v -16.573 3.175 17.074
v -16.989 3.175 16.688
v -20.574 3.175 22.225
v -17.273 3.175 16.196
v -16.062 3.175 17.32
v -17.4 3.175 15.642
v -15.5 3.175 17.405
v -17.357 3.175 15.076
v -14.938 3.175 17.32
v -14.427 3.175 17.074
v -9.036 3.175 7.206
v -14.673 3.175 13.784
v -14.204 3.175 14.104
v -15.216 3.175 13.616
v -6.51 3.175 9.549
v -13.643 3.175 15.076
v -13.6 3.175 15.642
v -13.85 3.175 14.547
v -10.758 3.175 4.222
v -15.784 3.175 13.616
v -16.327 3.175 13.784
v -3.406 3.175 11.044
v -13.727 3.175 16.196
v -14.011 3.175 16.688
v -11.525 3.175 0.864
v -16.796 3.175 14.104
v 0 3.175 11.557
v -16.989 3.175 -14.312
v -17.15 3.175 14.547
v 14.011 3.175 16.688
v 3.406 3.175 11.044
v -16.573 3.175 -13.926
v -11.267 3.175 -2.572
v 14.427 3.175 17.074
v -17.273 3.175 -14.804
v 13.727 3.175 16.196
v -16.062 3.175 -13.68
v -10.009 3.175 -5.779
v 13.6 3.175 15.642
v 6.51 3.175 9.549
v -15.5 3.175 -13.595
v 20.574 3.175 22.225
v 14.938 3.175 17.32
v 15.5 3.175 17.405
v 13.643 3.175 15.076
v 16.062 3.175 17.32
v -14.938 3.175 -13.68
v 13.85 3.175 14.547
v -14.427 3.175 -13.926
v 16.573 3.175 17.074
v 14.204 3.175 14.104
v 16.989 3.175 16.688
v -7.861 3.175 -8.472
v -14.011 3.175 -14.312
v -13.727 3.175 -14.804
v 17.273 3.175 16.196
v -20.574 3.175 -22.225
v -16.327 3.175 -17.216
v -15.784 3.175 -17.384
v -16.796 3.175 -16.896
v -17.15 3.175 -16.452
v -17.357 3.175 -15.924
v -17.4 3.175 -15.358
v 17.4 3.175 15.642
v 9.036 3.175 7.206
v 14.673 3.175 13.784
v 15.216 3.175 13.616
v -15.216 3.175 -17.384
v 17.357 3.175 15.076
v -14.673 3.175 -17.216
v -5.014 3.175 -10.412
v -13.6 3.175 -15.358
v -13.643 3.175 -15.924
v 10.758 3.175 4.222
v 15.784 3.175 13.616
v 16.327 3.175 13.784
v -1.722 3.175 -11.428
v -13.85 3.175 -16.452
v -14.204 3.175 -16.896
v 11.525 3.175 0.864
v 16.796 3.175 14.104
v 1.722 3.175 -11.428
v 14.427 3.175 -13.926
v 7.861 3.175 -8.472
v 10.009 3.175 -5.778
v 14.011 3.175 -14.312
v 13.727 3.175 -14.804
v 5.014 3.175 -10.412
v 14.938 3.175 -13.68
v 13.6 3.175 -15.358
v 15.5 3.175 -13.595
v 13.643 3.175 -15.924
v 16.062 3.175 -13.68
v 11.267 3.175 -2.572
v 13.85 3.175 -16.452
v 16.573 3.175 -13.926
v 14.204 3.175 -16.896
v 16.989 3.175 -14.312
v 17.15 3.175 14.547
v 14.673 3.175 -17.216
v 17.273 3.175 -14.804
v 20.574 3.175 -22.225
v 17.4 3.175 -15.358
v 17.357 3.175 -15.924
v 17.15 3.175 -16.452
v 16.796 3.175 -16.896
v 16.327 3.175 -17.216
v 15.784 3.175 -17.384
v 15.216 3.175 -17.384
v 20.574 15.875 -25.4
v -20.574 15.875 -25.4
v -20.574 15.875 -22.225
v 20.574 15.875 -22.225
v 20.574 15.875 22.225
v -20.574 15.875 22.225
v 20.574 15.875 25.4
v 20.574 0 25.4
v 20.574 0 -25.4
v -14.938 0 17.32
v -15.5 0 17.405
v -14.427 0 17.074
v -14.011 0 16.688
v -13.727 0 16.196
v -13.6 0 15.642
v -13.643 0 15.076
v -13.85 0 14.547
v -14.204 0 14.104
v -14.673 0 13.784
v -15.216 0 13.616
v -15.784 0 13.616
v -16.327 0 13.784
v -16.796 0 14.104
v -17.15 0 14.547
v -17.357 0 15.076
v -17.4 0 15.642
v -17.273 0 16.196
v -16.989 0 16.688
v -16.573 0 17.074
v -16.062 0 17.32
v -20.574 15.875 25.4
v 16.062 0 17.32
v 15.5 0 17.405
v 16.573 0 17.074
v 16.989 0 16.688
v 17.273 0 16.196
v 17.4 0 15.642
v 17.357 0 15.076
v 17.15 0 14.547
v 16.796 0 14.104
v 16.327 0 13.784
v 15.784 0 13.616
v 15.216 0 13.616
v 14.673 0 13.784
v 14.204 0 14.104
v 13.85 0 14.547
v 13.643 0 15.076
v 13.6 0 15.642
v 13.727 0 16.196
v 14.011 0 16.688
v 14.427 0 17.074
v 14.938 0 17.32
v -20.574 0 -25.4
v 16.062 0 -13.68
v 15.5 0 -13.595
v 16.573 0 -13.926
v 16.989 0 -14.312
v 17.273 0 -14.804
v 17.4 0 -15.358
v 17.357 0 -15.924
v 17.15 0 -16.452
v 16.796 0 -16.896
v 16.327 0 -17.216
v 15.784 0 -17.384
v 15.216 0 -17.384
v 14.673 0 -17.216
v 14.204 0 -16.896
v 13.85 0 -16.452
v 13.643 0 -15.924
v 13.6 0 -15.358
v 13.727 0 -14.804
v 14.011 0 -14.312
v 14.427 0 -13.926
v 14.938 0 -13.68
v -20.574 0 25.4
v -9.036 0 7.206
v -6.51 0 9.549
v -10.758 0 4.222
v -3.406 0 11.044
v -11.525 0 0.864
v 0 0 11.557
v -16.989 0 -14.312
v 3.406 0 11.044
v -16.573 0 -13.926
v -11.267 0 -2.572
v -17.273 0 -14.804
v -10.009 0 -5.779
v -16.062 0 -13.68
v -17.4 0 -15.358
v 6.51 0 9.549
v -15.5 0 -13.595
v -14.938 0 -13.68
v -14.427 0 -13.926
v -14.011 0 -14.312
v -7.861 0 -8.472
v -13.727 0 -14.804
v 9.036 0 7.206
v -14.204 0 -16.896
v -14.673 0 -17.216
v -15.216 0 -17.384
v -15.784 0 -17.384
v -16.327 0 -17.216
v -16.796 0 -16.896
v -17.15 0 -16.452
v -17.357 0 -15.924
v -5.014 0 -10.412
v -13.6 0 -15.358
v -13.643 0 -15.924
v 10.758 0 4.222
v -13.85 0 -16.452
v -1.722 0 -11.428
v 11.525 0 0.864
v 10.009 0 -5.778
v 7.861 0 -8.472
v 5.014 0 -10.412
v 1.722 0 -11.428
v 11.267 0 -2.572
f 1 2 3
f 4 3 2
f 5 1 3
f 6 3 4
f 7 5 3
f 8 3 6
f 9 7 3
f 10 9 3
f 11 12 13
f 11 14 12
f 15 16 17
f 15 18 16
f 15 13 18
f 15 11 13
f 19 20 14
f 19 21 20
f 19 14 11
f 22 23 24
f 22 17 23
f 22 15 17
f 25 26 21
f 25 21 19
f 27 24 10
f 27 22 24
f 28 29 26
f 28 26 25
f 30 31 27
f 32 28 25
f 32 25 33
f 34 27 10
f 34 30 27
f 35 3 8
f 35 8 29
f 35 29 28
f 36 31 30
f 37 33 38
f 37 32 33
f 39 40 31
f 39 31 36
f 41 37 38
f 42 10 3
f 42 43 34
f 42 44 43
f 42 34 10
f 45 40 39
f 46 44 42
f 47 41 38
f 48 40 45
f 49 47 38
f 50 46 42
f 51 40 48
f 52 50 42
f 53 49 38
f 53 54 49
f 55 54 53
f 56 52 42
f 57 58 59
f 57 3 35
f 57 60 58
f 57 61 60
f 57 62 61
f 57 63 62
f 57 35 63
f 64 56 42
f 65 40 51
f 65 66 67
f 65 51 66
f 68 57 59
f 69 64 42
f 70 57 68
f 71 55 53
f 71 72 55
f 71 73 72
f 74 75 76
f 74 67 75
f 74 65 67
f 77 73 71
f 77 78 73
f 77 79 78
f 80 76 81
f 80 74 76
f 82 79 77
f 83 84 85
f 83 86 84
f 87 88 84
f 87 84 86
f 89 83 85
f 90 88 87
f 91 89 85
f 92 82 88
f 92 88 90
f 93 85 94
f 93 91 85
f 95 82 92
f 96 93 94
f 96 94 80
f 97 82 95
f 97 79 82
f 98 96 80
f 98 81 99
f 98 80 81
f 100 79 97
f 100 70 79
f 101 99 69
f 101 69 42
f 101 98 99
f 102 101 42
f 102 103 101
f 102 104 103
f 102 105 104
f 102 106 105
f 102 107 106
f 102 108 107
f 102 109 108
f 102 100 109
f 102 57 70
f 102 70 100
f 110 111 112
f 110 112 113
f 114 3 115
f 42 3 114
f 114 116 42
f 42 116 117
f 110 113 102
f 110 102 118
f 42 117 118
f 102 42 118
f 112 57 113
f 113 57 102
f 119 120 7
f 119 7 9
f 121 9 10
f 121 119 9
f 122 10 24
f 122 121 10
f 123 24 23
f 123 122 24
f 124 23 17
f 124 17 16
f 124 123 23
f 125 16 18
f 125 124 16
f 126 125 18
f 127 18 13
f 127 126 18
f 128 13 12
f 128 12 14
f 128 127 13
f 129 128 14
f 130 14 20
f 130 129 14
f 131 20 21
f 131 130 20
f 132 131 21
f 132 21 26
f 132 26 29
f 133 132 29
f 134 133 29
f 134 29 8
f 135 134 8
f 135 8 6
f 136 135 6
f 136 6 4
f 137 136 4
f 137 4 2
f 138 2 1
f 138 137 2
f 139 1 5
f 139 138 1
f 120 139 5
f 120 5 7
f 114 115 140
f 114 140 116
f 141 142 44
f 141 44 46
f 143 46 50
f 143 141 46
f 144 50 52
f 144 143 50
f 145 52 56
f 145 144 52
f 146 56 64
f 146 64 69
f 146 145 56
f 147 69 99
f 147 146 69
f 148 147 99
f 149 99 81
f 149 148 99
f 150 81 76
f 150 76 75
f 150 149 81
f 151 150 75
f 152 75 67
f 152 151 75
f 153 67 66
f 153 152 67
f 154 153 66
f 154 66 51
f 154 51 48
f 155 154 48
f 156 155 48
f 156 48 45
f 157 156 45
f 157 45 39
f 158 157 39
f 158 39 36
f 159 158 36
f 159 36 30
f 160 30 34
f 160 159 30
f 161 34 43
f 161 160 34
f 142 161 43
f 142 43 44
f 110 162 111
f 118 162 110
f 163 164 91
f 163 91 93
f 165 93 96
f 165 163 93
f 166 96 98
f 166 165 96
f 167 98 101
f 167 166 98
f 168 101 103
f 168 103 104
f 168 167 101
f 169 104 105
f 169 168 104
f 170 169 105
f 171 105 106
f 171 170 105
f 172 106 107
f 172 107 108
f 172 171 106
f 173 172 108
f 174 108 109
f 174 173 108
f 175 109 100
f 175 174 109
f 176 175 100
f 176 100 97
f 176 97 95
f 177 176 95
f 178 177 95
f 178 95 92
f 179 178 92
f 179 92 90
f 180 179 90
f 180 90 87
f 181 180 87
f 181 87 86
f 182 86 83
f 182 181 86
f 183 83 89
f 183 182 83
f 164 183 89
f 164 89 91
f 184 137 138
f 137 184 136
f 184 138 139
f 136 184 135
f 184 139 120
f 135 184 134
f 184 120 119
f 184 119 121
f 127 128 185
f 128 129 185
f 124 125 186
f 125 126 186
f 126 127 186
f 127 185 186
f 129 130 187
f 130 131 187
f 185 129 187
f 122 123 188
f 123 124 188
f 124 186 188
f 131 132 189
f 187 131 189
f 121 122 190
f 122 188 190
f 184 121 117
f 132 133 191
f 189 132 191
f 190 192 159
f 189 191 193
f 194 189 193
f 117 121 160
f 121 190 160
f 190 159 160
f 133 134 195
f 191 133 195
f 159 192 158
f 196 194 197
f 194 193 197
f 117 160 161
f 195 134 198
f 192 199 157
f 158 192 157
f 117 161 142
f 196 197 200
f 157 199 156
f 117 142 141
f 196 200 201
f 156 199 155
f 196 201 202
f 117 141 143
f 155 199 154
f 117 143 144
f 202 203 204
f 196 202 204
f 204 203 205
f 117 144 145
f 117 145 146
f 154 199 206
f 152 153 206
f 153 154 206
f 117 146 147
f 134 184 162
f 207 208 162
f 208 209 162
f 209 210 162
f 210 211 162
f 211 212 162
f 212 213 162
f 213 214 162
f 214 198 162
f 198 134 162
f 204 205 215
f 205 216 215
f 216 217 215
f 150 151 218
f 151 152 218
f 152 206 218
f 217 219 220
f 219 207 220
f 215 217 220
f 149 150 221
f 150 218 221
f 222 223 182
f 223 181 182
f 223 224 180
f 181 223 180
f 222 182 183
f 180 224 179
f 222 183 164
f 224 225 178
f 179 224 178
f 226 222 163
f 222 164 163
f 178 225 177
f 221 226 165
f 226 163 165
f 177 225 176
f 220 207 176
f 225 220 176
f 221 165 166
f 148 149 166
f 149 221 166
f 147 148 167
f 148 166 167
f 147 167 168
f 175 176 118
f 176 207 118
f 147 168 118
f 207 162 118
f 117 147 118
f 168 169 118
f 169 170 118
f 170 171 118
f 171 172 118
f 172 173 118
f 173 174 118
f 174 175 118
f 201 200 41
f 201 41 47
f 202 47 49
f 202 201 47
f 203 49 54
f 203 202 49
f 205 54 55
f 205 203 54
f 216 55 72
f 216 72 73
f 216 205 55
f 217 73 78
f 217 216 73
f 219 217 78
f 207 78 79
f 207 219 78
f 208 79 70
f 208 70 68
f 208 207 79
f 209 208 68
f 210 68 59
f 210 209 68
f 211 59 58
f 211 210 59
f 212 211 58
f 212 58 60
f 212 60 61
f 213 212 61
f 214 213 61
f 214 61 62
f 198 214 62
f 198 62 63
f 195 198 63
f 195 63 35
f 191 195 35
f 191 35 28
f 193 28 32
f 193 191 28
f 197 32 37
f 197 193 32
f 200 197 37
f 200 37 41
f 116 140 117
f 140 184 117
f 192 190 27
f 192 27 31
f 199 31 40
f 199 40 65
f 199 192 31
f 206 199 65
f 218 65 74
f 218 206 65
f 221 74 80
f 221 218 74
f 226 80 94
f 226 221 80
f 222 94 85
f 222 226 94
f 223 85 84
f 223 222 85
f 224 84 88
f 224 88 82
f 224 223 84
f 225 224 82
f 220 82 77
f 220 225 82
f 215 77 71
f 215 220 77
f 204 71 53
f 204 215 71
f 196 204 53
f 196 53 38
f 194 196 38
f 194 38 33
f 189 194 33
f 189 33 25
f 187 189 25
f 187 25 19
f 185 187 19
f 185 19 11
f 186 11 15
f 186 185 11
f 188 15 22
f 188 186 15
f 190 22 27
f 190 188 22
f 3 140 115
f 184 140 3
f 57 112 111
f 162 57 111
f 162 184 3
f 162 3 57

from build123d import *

# Parameters (mm, degrees)
SKETCH1_W           = 41.148
SKETCH1_H           = 50.8
SKETCH1_R           = 11.557
SKETCH1_R_2         = 1.905
BOSS_EXTRUDE1_DEPTH = 3.175
SKETCH2_W           = 41.148
SKETCH2_H           = 3.175
BOSS_EXTRUDE2_DEPTH = 12.7


with BuildPart() as part:
    # Sketch1 → Boss-Extrude1 (new body)
    with BuildSketch(Plane(origin=(0, 0, 0), x_dir=(1, 0, 0), z_dir=(0, 1, 0))):
        Rectangle(SKETCH1_W, SKETCH1_H)
        with Locations(Location((0, 0, 0), (0, 0, 270))):
            Circle(SKETCH1_R, mode=Mode.SUBTRACT)
        with Locations(Location((-15.499999988, 15.499999988, 0), (0, 0, 270))):
            Circle(SKETCH1_R_2, mode=Mode.SUBTRACT)
        with Locations(Location((15.499999988, 15.499999988, 0), (0, 0, 270))):
            Circle(SKETCH1_R_2, mode=Mode.SUBTRACT)
        with Locations(Location((15.499999988, -15.499999988, 0), (0, 0, 270))):
            Circle(SKETCH1_R_2, mode=Mode.SUBTRACT)
        with Locations(Location((-15.499999988, -15.499999988, 0), (0, 0, 270))):
            Circle(SKETCH1_R_2, mode=Mode.SUBTRACT)
    extrude(amount=BOSS_EXTRUDE1_DEPTH)

    # Sketch2 → Boss-Extrude2 (add)
    with BuildSketch(Plane(origin=(0, 3.175, 0), x_dir=(1, 0, 0), z_dir=(0, 1, 0))):
        with Locations((0, -23.8125)):
            Rectangle(SKETCH2_W, SKETCH2_H)
        with Locations((0, 23.8125)):
            Rectangle(SKETCH2_W, SKETCH2_H)
    extrude(amount=BOSS_EXTRUDE2_DEPTH)


solid = part.part
